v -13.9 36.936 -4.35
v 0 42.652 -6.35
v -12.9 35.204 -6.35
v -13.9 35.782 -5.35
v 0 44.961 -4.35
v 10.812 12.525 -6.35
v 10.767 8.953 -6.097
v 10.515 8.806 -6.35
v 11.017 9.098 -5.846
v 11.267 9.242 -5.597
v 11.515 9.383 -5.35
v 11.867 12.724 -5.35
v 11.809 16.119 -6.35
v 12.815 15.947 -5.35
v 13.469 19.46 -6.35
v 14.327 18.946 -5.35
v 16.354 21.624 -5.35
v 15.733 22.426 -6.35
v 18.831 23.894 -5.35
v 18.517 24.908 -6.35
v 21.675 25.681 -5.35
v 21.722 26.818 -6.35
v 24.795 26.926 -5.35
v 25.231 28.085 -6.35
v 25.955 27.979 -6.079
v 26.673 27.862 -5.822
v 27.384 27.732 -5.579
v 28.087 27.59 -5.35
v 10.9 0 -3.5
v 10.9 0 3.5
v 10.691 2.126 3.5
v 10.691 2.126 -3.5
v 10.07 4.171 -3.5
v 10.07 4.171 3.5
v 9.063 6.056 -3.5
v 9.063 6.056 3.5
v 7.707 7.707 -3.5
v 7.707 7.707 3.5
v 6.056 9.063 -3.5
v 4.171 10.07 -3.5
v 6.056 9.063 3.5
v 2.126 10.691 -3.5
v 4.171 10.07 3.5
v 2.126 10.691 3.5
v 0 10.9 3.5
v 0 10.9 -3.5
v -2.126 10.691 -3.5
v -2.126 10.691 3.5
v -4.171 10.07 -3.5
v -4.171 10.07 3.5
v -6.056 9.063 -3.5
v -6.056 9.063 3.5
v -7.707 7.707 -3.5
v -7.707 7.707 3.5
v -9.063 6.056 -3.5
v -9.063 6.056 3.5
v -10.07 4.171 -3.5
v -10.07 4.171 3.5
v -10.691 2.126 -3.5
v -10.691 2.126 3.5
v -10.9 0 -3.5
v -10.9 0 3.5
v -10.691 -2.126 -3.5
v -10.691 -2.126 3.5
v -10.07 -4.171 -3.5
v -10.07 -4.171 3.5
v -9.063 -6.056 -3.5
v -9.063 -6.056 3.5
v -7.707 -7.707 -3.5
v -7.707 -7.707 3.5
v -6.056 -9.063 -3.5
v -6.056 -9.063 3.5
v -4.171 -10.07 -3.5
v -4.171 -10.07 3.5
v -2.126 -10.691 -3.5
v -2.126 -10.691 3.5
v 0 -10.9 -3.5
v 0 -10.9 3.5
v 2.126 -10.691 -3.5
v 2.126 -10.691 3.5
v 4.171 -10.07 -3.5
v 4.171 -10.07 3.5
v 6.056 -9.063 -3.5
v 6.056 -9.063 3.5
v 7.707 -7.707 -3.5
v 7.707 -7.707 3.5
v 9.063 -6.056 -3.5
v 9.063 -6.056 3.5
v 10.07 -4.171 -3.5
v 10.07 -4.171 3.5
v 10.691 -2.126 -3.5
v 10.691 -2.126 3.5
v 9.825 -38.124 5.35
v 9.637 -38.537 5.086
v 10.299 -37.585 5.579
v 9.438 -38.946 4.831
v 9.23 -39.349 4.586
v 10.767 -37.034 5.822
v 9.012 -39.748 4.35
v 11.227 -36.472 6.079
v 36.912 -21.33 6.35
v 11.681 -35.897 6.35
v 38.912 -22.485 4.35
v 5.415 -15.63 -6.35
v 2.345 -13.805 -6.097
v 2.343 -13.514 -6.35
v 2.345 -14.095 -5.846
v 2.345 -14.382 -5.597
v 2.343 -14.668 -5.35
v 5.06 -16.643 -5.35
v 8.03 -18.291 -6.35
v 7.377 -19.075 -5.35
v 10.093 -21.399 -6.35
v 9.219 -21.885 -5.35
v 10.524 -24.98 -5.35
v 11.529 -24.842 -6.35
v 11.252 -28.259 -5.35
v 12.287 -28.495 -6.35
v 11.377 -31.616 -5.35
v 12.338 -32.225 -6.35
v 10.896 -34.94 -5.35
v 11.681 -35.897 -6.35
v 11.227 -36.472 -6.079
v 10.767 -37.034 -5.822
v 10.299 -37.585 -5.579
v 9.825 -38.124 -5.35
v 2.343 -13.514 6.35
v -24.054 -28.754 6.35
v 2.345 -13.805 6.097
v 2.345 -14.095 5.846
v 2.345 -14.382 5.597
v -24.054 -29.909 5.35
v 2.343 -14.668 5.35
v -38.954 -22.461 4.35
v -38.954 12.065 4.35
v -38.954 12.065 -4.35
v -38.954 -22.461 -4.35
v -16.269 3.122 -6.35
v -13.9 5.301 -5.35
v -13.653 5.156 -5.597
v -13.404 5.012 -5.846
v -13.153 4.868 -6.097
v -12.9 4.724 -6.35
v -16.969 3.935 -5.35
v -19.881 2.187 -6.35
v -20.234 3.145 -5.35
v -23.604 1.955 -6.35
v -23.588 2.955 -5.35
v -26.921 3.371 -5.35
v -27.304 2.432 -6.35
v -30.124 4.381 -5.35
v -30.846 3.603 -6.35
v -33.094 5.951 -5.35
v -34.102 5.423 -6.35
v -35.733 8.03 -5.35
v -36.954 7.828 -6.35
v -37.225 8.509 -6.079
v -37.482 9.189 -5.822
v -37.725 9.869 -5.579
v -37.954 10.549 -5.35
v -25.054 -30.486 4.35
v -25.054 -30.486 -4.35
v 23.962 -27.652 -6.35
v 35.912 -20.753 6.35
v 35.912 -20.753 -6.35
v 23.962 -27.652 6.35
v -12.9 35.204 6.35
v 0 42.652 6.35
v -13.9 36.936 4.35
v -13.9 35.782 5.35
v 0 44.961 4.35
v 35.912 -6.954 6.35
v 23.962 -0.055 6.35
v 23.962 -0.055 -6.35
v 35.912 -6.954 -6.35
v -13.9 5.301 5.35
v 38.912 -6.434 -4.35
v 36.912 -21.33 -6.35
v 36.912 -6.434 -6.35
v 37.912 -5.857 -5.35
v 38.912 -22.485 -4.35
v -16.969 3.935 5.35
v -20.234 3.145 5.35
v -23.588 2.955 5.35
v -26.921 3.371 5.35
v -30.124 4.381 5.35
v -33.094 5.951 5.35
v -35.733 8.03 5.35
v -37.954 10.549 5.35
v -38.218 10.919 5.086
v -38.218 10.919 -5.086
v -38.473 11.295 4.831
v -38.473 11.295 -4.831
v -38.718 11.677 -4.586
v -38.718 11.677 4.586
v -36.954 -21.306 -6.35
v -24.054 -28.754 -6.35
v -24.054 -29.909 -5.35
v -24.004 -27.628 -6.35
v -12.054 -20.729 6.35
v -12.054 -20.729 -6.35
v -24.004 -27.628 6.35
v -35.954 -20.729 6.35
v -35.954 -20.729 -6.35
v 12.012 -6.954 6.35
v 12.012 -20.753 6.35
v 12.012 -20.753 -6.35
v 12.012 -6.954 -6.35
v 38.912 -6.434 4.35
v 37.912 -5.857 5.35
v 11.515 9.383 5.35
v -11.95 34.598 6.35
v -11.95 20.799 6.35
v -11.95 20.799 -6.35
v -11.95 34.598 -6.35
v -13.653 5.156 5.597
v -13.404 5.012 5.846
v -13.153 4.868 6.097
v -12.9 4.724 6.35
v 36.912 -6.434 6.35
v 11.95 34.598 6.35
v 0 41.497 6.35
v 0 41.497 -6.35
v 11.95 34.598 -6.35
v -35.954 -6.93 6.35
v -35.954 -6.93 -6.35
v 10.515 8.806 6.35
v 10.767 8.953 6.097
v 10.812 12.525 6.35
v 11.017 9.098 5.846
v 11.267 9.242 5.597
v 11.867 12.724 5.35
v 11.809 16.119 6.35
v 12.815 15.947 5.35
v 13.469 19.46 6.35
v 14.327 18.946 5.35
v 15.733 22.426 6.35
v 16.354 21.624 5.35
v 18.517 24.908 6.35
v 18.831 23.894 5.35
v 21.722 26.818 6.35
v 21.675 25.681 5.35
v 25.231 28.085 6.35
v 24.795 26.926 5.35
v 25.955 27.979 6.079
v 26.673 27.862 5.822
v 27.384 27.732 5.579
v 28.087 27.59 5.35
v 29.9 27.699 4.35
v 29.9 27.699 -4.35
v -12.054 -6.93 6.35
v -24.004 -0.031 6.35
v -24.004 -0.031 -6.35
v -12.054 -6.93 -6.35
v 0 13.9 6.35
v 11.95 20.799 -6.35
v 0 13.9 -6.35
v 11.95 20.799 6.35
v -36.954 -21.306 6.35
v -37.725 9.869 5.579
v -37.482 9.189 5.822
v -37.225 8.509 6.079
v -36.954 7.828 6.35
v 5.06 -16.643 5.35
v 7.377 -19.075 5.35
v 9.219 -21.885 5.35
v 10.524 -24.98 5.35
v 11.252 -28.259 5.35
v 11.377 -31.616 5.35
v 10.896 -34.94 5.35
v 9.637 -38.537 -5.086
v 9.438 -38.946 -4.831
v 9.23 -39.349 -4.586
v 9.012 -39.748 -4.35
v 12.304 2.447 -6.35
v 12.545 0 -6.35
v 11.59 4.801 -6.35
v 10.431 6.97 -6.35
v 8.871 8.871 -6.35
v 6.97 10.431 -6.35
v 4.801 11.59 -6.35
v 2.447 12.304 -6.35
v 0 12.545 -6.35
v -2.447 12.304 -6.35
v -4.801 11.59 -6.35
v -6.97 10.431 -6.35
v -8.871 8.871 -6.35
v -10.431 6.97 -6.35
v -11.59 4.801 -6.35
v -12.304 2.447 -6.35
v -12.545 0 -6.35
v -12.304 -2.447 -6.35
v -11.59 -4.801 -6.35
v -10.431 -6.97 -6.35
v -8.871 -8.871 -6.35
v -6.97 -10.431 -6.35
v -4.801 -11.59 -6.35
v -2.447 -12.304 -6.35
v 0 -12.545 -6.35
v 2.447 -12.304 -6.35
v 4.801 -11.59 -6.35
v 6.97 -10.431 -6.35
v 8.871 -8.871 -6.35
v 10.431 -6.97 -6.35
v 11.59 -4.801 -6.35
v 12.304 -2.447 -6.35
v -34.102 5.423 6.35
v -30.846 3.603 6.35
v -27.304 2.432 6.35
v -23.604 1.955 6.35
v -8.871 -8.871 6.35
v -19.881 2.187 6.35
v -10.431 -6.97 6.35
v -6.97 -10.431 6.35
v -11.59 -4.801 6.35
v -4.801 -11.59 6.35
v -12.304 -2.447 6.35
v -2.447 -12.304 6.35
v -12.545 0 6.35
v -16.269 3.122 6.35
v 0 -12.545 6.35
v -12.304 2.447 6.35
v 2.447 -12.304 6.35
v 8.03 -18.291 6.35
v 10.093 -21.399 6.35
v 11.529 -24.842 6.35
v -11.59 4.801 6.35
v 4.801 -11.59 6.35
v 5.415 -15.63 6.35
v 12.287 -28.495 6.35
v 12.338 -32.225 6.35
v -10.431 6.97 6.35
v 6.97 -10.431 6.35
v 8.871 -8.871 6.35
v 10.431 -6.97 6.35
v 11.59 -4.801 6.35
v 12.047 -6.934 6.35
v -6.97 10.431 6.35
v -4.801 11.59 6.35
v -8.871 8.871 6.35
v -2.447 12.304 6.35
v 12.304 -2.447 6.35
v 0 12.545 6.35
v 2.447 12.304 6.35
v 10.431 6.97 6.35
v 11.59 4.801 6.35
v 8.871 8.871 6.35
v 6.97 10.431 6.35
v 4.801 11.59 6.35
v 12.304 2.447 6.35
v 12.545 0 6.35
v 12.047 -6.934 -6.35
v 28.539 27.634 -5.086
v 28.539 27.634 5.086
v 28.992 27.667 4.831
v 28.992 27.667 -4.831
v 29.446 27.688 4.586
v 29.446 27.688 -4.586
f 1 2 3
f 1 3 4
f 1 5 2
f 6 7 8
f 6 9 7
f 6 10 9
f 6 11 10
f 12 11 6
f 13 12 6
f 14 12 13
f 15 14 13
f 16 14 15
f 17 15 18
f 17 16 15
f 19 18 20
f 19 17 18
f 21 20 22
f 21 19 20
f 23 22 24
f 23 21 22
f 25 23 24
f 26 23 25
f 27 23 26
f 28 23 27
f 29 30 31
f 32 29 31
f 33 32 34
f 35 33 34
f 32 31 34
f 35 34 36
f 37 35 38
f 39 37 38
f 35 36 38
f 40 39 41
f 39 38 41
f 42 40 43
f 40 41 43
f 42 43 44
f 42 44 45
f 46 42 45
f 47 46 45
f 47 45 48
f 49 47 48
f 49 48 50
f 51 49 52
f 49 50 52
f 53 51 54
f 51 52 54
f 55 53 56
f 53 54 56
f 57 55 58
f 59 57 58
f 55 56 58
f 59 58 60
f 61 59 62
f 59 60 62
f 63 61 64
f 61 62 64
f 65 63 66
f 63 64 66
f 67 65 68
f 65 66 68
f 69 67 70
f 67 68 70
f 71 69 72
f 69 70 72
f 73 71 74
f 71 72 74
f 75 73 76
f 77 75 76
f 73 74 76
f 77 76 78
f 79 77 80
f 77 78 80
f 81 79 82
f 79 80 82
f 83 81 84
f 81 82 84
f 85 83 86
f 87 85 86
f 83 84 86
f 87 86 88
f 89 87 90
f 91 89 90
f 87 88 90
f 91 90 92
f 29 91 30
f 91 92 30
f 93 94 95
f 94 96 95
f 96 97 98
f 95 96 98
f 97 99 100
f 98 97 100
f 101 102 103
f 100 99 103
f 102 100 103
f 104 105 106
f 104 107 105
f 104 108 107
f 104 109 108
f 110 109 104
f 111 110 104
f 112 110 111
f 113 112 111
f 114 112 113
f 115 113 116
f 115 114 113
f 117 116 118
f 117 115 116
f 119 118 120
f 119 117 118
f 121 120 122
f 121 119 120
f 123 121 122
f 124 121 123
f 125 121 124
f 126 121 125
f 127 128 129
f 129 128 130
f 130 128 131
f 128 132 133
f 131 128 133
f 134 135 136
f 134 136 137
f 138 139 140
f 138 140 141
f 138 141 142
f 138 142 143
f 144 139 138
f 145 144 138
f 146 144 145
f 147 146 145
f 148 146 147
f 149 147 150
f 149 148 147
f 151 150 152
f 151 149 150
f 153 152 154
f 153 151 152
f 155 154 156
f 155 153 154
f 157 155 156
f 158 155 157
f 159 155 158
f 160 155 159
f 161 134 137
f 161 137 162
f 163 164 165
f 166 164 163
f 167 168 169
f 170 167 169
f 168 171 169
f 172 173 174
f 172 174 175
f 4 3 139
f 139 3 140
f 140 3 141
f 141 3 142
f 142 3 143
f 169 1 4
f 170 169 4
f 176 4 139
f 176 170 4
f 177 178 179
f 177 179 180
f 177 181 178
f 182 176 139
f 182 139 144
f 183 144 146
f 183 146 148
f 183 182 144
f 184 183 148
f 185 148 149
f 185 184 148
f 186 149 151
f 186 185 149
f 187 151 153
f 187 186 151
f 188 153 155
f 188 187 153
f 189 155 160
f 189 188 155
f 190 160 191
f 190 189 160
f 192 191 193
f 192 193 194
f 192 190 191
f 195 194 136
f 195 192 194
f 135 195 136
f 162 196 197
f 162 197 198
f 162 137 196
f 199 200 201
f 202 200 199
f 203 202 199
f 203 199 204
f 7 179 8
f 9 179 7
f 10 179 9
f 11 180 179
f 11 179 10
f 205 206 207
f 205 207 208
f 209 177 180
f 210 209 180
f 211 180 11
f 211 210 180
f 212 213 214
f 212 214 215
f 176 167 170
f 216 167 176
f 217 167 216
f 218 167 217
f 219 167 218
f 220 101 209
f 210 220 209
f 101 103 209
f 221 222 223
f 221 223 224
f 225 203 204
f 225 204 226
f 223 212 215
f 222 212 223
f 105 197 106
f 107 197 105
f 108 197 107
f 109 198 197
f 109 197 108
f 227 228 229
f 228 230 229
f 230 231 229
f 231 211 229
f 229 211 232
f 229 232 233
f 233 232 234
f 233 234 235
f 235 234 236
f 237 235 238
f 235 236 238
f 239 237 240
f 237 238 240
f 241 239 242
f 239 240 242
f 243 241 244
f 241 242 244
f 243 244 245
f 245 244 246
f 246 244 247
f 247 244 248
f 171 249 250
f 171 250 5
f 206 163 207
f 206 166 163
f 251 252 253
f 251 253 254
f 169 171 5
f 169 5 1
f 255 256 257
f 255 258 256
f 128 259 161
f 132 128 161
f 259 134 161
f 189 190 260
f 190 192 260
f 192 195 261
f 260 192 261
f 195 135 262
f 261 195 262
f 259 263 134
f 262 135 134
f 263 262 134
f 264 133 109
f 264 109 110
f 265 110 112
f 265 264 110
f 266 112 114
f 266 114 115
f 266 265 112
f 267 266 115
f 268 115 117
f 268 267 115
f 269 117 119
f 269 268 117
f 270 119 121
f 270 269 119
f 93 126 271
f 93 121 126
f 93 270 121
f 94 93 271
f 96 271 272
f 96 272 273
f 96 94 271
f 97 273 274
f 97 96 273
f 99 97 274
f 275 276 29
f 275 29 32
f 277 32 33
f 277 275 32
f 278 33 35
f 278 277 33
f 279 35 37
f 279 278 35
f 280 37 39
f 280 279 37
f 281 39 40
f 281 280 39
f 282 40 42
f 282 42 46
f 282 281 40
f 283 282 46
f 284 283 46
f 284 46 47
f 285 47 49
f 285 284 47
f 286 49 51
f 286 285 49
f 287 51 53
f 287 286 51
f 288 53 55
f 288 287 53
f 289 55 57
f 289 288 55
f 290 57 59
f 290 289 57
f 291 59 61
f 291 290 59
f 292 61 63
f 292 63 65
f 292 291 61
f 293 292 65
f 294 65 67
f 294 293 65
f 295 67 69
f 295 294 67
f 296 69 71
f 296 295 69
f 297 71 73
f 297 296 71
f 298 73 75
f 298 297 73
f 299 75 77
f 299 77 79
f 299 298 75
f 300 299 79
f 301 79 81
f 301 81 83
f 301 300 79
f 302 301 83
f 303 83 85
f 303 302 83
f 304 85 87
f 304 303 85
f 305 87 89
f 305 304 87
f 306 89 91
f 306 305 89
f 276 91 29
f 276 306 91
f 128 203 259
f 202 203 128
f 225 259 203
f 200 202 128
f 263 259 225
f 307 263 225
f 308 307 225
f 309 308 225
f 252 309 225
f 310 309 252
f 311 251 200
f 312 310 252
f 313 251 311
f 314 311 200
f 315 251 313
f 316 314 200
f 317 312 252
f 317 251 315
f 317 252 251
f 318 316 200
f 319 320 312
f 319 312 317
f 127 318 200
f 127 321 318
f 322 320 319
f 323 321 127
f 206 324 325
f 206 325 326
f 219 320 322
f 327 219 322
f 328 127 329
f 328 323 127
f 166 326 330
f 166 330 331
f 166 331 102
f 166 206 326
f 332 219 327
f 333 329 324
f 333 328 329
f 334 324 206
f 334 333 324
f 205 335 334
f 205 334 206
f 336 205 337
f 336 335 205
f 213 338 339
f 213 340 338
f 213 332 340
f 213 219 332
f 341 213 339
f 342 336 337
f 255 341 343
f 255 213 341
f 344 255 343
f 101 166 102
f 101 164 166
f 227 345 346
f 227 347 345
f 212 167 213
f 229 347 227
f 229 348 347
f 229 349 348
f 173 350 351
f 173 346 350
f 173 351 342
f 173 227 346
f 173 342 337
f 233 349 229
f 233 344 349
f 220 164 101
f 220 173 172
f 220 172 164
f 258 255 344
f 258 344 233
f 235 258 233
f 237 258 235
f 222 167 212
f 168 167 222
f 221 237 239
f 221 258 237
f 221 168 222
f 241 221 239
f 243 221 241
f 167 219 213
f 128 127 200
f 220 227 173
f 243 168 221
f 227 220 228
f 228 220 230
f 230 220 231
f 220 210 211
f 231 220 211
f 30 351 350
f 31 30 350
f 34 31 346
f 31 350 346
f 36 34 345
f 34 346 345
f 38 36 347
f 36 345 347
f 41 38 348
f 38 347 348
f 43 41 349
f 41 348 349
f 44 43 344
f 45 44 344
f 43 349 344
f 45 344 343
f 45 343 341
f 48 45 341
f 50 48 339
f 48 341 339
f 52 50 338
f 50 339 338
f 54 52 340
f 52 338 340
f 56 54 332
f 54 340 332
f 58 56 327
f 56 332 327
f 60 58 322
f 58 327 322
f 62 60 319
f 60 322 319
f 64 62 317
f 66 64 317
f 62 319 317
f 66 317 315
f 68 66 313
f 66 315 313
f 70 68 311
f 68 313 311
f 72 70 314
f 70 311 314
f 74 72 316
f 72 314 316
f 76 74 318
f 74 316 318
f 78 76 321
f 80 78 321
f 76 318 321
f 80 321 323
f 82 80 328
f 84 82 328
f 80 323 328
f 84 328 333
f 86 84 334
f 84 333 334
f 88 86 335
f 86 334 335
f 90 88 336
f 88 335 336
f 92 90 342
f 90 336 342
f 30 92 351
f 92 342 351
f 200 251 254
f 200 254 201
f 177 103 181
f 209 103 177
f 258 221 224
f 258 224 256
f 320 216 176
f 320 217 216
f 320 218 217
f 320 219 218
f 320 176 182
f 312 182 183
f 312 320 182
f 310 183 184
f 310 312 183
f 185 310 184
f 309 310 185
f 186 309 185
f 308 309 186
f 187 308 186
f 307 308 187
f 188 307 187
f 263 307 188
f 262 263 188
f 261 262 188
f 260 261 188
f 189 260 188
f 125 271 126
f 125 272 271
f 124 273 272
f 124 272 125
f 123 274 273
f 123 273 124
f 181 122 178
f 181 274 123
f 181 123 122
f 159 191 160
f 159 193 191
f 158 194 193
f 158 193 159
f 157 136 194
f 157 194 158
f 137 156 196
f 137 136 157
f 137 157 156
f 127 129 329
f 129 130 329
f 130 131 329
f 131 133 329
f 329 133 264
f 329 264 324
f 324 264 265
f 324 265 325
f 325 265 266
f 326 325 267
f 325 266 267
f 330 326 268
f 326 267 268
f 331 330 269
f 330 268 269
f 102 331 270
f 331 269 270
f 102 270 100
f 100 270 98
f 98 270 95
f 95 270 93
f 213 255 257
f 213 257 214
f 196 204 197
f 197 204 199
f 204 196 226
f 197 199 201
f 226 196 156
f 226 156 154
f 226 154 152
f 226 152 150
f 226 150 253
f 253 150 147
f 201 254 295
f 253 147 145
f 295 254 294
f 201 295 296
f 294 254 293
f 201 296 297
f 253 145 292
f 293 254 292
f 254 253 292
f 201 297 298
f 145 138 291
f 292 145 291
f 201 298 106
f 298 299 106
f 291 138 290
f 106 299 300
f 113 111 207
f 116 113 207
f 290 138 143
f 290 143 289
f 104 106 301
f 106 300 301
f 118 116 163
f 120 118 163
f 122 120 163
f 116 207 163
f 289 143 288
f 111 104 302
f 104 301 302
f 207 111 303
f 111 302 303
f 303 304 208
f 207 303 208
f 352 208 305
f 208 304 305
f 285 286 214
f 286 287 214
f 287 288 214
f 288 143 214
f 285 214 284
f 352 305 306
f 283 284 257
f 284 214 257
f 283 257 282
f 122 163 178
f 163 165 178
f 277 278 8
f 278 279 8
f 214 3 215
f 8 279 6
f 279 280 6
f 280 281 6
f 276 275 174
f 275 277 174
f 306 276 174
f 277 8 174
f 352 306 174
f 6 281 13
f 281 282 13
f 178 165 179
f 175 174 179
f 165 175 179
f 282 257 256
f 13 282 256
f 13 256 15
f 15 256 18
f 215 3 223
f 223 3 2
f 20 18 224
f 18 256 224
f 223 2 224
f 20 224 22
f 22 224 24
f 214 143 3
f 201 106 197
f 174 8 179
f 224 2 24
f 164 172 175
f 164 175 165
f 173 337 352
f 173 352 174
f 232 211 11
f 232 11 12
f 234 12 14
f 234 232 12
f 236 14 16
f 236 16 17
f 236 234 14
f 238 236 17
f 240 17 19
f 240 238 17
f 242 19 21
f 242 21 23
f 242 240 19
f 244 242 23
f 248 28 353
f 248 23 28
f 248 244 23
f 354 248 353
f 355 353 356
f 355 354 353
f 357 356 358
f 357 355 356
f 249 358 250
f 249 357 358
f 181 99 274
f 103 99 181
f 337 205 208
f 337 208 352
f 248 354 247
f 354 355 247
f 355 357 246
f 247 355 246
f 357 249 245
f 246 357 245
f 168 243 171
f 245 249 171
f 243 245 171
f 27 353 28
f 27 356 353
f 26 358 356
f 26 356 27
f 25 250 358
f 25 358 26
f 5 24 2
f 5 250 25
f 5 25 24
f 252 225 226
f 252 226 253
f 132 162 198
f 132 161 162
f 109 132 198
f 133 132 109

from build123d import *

# Parameters (mm, degrees)
F2_DEPTH = 6.35
F0_R     = 10.9
F3_DEPTH = 12.5
F4_SIZE  = 2
F5_SIZE  = 1
F6_SIZE2 = 1.6454482672
F6_SIZE  = 2.85


with BuildPart() as f2:
    # F1 (on Top) → F2 (new body, symmetric)
    with BuildSketch(Plane.XY):
        with BuildLine():
            Line((-13.9, 36.9362757407), (-13.9, 5.3005428515))
            ThreePointArc((-13.9, 5.3005428515), (-27.8029336636, 3.5865442194), (-38.954053502, 12.0648625736))
            Line((-38.954053502, 12.0648625736), (-38.954053502, -22.4606835239))
            Line((-38.954053502, -22.4606835239), (-25.054053502, -30.4858522656))
            Line((-25.054053502, -30.4858522656), (2.3432948474, -14.667985821))
            ThreePointArc((2.3432948474, -14.667985821), (10.7791280366, -25.8512802448), (9.0122488797, -39.7475924826))
            Line((9.0122488797, -39.7475924826), (38.9122488797, -22.4848194339))
            Line((38.9122488797, -22.4848194339), (38.9122488797, -6.4344819504))
            Line((38.9122488797, -6.4344819504), (11.5149005303, 9.3833844942))
            ThreePointArc((11.5149005303, 9.3833844942), (16.9820010047, 22.2806775501), (29.9, 27.6986714336))
            Line((29.9, 27.6986714336), (0, 44.9614444824))
            Line((0, 44.9614444824), (-13.9, 36.9362757407))
        make_face()
        Polygon((-24.004053502, -27.6279684332), (-35.954053502, -20.7286327163), (-35.954053502, -6.9299612827), (-24.004053502, -0.0306255659), (-12.054053502, -6.9299612827), (-12.054053502, -20.7286327163), align=None, mode=Mode.SUBTRACT)
        with BuildLine():
            ThreePointArc((0, 13.9), (9.8287842585, 9.8287842585), (13.9, 0))
            ThreePointArc((13.9, 0), (13.4287454536, -3.5887038806), (12.0469358931, -6.9340706361))
            Line((12.0469358931, -6.9340706361), (23.9622488797, -0.0547614759))
            Line((23.9622488797, -0.0547614759), (35.9122488797, -6.9540971927))
            Line((35.9122488797, -6.9540971927), (35.9122488797, -20.7527686263))
            Line((35.9122488797, -20.7527686263), (23.9622488797, -27.6521043431))
            Line((23.9622488797, -27.6521043431), (12.0122488797, -20.7527686263))
            Line((12.0122488797, -20.7527686263), (12.0122488797, -6.9939886226))
            ThreePointArc((12.0122488797, -6.9939886226), (-12.0504448435, -6.927970776), (0, 13.9))
        make_face(mode=Mode.SUBTRACT)
        Polygon((11.95, 20.7993357168), (0, 13.9), (-11.95, 20.7993357168), (-11.95, 34.5980071504), (0, 41.4973428673), (11.95, 34.5980071504), align=None, mode=Mode.SUBTRACT)
        with BuildLine():
            ThreePointArc((12.0469358931, -6.9340706361), (13.4287454536, -3.5887038806), (13.9, 0))
            ThreePointArc((13.9, 0), (9.8287842585, 9.8287842585), (0, 13.9))
            ThreePointArc((0, 13.9), (-12.0504448435, -6.927970776), (12.0122488797, -6.9939886226))
            Line((12.0122488797, -6.9939886226), (12.0122488797, -6.9540971927))
            Line((12.0122488797, -6.9540971927), (12.0469358931, -6.9340706361))
        make_face()
    extrude(amount=F2_DEPTH, both=True)

    # F0 (on Top) → F3 (cut, symmetric)
    with BuildSketch(Plane.XY):
        Circle(F0_R)
    extrude(amount=F3_DEPTH, both=True, mode=Mode.SUBTRACT)

    # F4
    f4_edges = [f2.edges().sort_by_distance(p)[0] for p in [
        (14.95, 36.330058, -6.35),
        (14.95, 36.330058, 6.35),
        (-38.954054, -5.19791, 6.35),
        (-38.954054, -5.19791, -6.35),
        (-32.004054, -26.473268, -6.35),
        (-32.004054, -26.473268, 6.35),
        (23.962249, -31.116206, -6.35),
        (23.962249, -31.116206, 6.35),
        (38.912249, -14.459651, 6.35),
        (38.912249, -14.459651, -6.35),
        (-6.95, 40.94886, -6.35),
        (-6.95, 40.94886, 6.35),
    ]]
    chamfer(f4_edges, length=F4_SIZE)

    # F5
    f5_edges = [f2.edges().sort_by_distance(p)[0] for p in [
        (-10.355379, -21.999569, 6.35),
        (-10.355379, -21.999569, -6.35),
        (-13.9, 19.963709, -6.35),
        (-13.9, 19.963709, 6.35),
        (24.213575, 2.051802, 6.35),
        (24.213575, 2.051802, -6.35),
        (15.828699, 21.020998, 6.35),
        (15.828699, 21.020998, -6.35),
        (-26.135368, 3.217595, 6.35),
        (-26.135368, 3.217595, -6.35),
        (10.264865, -24.222651, -6.35),
        (10.264865, -24.222651, 6.35),
    ]]
    chamfer(f5_edges, length=F5_SIZE)

    # F6
    f6_edges = [f2.edges().sort_by_distance(p)[0] for p in [
        (-10.9, 0, 6.35),
        (-10.9, 0, -6.35),
    ]]
    f6_side = f2.faces().sort_by_distance((-10.9, 0, 0))[0]
    chamfer(f6_edges, length=F6_SIZE, length2=F6_SIZE2, reference=f6_side)


solid = f2.part
